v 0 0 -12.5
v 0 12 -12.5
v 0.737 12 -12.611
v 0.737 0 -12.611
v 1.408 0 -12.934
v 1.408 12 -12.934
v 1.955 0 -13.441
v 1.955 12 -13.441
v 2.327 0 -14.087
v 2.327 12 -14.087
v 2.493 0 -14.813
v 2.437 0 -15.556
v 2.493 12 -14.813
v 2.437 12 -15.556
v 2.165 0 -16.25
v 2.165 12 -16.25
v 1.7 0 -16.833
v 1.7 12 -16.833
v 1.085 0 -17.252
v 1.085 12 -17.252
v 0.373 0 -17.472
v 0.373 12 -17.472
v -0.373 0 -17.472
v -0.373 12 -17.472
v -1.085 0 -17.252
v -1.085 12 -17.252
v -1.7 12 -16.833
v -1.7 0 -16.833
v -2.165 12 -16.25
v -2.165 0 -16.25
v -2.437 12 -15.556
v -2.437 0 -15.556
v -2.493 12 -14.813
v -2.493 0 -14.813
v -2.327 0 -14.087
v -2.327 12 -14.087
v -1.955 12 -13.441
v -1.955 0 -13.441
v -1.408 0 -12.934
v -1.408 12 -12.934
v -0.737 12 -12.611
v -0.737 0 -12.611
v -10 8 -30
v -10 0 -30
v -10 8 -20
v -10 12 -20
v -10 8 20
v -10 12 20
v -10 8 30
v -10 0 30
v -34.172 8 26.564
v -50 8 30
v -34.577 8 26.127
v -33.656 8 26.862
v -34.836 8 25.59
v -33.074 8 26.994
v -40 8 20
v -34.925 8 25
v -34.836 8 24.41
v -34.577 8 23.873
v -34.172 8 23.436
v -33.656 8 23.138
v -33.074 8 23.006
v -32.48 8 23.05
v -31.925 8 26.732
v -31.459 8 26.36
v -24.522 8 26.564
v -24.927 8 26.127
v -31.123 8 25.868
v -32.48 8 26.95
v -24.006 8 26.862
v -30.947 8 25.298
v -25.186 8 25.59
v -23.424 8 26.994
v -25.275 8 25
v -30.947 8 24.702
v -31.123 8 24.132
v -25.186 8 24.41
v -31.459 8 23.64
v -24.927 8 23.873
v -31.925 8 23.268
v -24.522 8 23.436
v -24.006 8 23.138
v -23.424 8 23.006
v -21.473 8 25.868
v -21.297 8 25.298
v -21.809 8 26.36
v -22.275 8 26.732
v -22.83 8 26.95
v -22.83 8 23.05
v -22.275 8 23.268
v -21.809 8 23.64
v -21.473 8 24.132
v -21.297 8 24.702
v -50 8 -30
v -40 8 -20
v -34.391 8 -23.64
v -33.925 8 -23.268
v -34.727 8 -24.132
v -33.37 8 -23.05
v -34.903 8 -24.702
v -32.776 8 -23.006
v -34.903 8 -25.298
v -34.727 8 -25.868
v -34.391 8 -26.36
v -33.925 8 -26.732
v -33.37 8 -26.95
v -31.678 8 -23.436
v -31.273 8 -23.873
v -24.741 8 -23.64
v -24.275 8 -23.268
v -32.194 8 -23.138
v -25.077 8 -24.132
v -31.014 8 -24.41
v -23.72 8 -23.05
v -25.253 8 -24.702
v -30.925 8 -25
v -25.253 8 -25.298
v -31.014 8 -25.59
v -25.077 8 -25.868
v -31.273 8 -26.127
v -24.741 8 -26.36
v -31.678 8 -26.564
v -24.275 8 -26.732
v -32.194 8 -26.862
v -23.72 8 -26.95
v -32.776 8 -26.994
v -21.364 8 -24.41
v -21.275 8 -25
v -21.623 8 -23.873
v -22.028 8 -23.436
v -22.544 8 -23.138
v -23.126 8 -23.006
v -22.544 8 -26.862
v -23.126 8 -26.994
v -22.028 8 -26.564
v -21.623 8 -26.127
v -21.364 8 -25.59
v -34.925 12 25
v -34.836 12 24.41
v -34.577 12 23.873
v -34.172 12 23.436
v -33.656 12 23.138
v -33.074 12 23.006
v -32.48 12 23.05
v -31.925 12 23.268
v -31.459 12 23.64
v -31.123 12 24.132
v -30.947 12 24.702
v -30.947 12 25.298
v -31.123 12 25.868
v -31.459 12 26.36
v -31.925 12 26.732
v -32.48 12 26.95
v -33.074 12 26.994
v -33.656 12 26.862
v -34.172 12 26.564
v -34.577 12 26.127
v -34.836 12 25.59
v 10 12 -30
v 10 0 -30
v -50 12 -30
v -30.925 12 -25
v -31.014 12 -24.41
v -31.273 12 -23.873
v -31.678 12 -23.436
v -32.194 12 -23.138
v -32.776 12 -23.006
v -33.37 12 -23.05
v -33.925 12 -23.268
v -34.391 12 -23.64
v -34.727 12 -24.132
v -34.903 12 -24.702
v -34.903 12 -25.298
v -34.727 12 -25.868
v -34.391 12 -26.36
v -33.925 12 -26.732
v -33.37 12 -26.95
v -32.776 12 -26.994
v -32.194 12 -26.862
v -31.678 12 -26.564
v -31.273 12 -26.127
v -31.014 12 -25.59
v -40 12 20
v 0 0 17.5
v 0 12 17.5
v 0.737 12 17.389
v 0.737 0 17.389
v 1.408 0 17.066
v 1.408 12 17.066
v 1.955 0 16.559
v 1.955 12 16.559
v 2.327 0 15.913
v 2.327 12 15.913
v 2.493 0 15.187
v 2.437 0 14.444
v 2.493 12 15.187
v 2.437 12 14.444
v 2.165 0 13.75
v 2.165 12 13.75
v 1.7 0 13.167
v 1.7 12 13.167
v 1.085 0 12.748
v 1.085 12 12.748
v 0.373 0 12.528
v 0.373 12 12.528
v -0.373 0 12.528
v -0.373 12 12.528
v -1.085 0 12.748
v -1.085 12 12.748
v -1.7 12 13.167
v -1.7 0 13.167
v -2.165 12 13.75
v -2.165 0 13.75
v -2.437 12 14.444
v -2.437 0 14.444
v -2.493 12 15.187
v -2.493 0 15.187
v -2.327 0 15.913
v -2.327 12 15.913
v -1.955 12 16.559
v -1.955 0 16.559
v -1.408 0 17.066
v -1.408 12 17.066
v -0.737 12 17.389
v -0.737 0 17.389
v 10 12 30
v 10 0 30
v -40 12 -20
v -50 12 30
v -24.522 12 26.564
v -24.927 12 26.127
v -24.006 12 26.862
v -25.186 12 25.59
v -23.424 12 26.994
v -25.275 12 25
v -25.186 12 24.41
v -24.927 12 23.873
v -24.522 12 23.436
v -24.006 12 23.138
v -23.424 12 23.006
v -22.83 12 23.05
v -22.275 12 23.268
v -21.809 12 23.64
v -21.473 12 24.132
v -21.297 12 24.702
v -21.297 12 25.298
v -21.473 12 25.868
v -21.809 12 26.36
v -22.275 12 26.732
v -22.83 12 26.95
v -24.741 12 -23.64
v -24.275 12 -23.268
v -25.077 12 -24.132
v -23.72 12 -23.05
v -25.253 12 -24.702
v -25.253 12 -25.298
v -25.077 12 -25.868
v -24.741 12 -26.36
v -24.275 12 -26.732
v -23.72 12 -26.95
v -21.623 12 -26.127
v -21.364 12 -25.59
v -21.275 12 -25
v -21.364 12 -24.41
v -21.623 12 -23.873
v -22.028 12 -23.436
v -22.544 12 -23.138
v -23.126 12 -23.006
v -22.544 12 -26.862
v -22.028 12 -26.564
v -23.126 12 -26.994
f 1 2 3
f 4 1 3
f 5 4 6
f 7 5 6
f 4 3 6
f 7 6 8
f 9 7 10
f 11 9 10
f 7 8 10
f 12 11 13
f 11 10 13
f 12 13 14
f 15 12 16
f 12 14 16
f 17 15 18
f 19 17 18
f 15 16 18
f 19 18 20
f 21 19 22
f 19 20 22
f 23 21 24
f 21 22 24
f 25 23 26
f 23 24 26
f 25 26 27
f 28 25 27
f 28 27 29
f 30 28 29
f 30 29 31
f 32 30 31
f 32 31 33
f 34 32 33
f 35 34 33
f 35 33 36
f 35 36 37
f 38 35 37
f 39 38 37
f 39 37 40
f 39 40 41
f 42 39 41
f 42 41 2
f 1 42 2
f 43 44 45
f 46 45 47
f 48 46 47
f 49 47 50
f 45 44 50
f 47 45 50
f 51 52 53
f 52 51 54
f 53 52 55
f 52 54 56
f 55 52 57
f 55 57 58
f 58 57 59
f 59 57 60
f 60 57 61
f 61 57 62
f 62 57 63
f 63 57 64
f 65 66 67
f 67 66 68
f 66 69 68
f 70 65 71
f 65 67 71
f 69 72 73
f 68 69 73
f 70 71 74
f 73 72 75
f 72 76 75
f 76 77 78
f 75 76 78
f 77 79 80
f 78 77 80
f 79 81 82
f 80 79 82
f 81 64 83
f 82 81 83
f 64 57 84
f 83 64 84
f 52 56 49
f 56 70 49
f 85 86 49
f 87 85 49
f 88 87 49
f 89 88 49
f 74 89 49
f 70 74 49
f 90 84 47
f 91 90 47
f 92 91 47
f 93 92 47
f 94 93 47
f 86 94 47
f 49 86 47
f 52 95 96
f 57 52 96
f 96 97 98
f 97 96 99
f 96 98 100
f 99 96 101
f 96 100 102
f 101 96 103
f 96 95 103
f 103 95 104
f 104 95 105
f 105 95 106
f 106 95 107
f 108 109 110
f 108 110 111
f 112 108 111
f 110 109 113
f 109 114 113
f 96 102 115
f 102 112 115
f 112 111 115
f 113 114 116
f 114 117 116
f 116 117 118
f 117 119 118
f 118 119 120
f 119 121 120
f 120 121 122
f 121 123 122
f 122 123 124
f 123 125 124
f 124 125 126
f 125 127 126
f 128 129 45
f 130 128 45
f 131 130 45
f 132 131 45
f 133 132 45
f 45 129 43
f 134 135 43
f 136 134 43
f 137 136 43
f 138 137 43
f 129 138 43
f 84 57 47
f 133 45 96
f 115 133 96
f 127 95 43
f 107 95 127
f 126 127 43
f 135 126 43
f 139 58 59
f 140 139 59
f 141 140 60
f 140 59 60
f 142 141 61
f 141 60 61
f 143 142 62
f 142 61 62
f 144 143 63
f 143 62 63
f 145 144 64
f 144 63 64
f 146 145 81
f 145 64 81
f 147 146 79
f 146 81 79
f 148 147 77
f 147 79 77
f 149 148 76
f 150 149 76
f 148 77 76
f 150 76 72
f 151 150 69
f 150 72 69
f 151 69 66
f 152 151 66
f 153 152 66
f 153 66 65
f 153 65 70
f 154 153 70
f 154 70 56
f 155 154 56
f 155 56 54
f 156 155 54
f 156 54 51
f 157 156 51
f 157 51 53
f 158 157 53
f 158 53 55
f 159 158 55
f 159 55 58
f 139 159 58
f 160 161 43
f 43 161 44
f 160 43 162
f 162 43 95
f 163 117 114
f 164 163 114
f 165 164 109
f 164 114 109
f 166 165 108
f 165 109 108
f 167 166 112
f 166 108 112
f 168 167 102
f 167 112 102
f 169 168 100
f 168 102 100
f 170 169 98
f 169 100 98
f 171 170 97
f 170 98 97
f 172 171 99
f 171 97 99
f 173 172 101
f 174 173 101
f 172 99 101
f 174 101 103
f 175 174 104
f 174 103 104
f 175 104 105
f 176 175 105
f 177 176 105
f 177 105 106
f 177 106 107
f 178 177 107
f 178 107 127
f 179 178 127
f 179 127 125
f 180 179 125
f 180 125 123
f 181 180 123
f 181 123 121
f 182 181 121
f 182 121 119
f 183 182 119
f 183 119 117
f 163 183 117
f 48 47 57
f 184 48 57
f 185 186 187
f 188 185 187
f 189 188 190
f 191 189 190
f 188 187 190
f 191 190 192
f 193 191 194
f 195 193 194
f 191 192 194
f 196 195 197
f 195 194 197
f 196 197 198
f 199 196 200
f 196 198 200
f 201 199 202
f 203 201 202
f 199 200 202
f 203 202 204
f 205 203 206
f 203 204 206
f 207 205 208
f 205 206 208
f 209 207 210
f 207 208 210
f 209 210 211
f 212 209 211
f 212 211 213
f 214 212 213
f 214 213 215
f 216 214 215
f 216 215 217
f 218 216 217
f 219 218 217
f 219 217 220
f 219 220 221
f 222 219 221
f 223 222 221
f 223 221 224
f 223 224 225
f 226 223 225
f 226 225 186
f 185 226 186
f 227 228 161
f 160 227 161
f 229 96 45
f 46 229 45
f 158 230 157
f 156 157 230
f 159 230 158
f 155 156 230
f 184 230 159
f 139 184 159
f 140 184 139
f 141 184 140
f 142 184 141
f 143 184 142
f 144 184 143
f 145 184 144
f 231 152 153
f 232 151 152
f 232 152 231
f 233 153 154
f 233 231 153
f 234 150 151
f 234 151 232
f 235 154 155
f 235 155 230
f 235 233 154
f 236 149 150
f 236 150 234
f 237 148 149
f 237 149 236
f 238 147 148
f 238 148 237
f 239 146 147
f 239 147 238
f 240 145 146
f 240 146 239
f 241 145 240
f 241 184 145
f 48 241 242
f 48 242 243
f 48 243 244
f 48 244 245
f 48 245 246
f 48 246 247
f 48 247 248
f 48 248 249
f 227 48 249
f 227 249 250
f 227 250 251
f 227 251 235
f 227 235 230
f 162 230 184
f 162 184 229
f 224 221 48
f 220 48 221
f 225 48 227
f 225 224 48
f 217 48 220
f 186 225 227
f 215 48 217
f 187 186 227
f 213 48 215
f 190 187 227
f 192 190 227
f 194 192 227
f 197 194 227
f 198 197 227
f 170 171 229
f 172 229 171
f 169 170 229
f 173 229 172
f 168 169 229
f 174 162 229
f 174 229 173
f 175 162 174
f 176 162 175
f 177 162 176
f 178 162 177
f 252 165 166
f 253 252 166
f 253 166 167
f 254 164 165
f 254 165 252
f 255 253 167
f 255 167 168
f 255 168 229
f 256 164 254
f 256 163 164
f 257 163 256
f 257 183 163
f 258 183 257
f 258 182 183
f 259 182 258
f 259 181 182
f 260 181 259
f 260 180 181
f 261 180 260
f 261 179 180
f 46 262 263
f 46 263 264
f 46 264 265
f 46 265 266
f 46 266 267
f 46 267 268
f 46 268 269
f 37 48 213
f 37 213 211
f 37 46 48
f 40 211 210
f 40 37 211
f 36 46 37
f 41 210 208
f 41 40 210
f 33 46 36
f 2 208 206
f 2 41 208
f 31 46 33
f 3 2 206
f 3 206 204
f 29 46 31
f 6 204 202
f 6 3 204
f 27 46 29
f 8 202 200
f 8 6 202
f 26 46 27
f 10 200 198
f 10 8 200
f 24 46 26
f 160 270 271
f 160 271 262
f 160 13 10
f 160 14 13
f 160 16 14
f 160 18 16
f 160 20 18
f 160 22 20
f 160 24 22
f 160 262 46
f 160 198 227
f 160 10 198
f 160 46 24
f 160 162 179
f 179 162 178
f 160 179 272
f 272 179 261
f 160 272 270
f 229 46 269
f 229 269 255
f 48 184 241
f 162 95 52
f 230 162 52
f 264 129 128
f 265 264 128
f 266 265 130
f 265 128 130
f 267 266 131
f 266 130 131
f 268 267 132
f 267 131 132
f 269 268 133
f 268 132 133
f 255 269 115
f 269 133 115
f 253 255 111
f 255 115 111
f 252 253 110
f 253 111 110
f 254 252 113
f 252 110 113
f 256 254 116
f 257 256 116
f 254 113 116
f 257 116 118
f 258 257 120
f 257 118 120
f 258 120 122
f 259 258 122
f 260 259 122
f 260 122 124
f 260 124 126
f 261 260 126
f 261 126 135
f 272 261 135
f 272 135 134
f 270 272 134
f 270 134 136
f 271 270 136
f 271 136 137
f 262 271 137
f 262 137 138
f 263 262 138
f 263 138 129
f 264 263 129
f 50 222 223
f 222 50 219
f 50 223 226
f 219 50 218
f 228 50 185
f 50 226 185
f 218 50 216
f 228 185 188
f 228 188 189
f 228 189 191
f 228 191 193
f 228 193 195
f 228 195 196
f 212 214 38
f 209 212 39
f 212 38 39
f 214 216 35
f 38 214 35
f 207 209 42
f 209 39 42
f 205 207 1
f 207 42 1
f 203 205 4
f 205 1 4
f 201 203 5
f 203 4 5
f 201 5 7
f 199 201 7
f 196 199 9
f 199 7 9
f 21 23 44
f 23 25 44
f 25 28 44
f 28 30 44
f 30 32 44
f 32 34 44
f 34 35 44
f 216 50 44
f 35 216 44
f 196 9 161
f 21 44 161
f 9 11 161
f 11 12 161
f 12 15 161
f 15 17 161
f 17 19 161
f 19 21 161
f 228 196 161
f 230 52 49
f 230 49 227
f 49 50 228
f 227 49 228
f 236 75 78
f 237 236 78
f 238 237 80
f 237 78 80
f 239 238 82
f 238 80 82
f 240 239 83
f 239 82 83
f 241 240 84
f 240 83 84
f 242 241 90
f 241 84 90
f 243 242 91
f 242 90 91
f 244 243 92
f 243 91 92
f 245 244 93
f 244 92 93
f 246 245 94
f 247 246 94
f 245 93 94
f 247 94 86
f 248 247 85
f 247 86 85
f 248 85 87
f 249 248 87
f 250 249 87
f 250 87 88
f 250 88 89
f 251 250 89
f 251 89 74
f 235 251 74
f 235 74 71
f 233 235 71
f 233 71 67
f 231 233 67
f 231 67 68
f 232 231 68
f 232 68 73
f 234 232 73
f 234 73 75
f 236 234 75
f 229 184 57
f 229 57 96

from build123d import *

# Parameters (mm, degrees)
SKETCH_1_W          = 20
SKETCH_1_H          = 60
EXTRUDE_1_DEPTH     = 8
EXTRUDE_2_DEPTH     = 4
SKETCH_4_W          = 10
SKETCH_4_H          = 60
EXTRUDE_3_DEPTH     = 4
SKETCH_5_R          = 2.5
CUT_EXTRUDE_1_DEPTH = 67
CUT_EXTRUDE_2_DEPTH = 10


with BuildPart() as part:
    # 草图1 → 凸台-拉伸1 (new body)
    with BuildSketch(Plane(origin=(0, 0, 0), x_dir=(1, 0, 0), z_dir=(0, 1, 0))):
        Rectangle(SKETCH_1_W, SKETCH_1_H)
    extrude(amount=EXTRUDE_1_DEPTH)

    # 草图3 → 凸台-拉伸2 (add)
    with BuildSketch(Plane(origin=(0, 8, 0), x_dir=(1, 0, 0), z_dir=(0, 1, 0))):
        Polygon((10, -30), (10, 30), (-50, 30), (-50, 20), (-10, 20), (-10, -20), (-50, -20), (-50, -30), align=None)
    extrude(amount=EXTRUDE_2_DEPTH)

    # 草图4 → 凸台-拉伸3 (add)
    with BuildSketch(Plane(origin=(0, 12, 0), x_dir=(1, 0, 0), z_dir=(0, 1, 0))):
        with Locations((-45, 0)):
            Rectangle(SKETCH_4_W, SKETCH_4_H)
    extrude(amount=-EXTRUDE_3_DEPTH)

    # 草图5 → 切除-拉伸1 (cut)
    with BuildSketch(Plane(origin=(0, 12, 0), x_dir=(1, 0, 0), z_dir=(0, 1, 0))):
        with Locations(Location((0, 15, 0), (0, 0, 270))):
            Circle(SKETCH_5_R)
        with Locations(Location((0, -15, 0), (0, 0, 270))):
            Circle(SKETCH_5_R)
    extrude(amount=-CUT_EXTRUDE_1_DEPTH, mode=Mode.SUBTRACT)

    # 草图7 → 切除-拉伸2 (cut)
    with BuildSketch(Plane.XZ.offset(-8)):
        with BuildLine():
            ThreePointArc((-21.275, 25), (-23.275, 27), (-25.275, 25))
            ThreePointArc((-25.275, 25), (-23.275, 23), (-21.275, 25))
        make_face()
        with BuildLine():
            ThreePointArc((-30.925, 25), (-32.925, 27), (-34.925, 25))
            ThreePointArc((-34.925, 25), (-32.925, 23), (-30.925, 25))
        make_face()
        with BuildLine():
            ThreePointArc((-25.275, -25), (-23.275, -27), (-21.275, -25))
            ThreePointArc((-21.275, -25), (-23.275, -23), (-25.275, -25))
        make_face()
        with BuildLine():
            ThreePointArc((-34.925, -25), (-32.925, -27), (-30.925, -25))
            ThreePointArc((-30.925, -25), (-32.925, -23), (-34.925, -25))
        make_face()
    extrude(amount=-CUT_EXTRUDE_2_DEPTH, mode=Mode.SUBTRACT)


solid = part.part
